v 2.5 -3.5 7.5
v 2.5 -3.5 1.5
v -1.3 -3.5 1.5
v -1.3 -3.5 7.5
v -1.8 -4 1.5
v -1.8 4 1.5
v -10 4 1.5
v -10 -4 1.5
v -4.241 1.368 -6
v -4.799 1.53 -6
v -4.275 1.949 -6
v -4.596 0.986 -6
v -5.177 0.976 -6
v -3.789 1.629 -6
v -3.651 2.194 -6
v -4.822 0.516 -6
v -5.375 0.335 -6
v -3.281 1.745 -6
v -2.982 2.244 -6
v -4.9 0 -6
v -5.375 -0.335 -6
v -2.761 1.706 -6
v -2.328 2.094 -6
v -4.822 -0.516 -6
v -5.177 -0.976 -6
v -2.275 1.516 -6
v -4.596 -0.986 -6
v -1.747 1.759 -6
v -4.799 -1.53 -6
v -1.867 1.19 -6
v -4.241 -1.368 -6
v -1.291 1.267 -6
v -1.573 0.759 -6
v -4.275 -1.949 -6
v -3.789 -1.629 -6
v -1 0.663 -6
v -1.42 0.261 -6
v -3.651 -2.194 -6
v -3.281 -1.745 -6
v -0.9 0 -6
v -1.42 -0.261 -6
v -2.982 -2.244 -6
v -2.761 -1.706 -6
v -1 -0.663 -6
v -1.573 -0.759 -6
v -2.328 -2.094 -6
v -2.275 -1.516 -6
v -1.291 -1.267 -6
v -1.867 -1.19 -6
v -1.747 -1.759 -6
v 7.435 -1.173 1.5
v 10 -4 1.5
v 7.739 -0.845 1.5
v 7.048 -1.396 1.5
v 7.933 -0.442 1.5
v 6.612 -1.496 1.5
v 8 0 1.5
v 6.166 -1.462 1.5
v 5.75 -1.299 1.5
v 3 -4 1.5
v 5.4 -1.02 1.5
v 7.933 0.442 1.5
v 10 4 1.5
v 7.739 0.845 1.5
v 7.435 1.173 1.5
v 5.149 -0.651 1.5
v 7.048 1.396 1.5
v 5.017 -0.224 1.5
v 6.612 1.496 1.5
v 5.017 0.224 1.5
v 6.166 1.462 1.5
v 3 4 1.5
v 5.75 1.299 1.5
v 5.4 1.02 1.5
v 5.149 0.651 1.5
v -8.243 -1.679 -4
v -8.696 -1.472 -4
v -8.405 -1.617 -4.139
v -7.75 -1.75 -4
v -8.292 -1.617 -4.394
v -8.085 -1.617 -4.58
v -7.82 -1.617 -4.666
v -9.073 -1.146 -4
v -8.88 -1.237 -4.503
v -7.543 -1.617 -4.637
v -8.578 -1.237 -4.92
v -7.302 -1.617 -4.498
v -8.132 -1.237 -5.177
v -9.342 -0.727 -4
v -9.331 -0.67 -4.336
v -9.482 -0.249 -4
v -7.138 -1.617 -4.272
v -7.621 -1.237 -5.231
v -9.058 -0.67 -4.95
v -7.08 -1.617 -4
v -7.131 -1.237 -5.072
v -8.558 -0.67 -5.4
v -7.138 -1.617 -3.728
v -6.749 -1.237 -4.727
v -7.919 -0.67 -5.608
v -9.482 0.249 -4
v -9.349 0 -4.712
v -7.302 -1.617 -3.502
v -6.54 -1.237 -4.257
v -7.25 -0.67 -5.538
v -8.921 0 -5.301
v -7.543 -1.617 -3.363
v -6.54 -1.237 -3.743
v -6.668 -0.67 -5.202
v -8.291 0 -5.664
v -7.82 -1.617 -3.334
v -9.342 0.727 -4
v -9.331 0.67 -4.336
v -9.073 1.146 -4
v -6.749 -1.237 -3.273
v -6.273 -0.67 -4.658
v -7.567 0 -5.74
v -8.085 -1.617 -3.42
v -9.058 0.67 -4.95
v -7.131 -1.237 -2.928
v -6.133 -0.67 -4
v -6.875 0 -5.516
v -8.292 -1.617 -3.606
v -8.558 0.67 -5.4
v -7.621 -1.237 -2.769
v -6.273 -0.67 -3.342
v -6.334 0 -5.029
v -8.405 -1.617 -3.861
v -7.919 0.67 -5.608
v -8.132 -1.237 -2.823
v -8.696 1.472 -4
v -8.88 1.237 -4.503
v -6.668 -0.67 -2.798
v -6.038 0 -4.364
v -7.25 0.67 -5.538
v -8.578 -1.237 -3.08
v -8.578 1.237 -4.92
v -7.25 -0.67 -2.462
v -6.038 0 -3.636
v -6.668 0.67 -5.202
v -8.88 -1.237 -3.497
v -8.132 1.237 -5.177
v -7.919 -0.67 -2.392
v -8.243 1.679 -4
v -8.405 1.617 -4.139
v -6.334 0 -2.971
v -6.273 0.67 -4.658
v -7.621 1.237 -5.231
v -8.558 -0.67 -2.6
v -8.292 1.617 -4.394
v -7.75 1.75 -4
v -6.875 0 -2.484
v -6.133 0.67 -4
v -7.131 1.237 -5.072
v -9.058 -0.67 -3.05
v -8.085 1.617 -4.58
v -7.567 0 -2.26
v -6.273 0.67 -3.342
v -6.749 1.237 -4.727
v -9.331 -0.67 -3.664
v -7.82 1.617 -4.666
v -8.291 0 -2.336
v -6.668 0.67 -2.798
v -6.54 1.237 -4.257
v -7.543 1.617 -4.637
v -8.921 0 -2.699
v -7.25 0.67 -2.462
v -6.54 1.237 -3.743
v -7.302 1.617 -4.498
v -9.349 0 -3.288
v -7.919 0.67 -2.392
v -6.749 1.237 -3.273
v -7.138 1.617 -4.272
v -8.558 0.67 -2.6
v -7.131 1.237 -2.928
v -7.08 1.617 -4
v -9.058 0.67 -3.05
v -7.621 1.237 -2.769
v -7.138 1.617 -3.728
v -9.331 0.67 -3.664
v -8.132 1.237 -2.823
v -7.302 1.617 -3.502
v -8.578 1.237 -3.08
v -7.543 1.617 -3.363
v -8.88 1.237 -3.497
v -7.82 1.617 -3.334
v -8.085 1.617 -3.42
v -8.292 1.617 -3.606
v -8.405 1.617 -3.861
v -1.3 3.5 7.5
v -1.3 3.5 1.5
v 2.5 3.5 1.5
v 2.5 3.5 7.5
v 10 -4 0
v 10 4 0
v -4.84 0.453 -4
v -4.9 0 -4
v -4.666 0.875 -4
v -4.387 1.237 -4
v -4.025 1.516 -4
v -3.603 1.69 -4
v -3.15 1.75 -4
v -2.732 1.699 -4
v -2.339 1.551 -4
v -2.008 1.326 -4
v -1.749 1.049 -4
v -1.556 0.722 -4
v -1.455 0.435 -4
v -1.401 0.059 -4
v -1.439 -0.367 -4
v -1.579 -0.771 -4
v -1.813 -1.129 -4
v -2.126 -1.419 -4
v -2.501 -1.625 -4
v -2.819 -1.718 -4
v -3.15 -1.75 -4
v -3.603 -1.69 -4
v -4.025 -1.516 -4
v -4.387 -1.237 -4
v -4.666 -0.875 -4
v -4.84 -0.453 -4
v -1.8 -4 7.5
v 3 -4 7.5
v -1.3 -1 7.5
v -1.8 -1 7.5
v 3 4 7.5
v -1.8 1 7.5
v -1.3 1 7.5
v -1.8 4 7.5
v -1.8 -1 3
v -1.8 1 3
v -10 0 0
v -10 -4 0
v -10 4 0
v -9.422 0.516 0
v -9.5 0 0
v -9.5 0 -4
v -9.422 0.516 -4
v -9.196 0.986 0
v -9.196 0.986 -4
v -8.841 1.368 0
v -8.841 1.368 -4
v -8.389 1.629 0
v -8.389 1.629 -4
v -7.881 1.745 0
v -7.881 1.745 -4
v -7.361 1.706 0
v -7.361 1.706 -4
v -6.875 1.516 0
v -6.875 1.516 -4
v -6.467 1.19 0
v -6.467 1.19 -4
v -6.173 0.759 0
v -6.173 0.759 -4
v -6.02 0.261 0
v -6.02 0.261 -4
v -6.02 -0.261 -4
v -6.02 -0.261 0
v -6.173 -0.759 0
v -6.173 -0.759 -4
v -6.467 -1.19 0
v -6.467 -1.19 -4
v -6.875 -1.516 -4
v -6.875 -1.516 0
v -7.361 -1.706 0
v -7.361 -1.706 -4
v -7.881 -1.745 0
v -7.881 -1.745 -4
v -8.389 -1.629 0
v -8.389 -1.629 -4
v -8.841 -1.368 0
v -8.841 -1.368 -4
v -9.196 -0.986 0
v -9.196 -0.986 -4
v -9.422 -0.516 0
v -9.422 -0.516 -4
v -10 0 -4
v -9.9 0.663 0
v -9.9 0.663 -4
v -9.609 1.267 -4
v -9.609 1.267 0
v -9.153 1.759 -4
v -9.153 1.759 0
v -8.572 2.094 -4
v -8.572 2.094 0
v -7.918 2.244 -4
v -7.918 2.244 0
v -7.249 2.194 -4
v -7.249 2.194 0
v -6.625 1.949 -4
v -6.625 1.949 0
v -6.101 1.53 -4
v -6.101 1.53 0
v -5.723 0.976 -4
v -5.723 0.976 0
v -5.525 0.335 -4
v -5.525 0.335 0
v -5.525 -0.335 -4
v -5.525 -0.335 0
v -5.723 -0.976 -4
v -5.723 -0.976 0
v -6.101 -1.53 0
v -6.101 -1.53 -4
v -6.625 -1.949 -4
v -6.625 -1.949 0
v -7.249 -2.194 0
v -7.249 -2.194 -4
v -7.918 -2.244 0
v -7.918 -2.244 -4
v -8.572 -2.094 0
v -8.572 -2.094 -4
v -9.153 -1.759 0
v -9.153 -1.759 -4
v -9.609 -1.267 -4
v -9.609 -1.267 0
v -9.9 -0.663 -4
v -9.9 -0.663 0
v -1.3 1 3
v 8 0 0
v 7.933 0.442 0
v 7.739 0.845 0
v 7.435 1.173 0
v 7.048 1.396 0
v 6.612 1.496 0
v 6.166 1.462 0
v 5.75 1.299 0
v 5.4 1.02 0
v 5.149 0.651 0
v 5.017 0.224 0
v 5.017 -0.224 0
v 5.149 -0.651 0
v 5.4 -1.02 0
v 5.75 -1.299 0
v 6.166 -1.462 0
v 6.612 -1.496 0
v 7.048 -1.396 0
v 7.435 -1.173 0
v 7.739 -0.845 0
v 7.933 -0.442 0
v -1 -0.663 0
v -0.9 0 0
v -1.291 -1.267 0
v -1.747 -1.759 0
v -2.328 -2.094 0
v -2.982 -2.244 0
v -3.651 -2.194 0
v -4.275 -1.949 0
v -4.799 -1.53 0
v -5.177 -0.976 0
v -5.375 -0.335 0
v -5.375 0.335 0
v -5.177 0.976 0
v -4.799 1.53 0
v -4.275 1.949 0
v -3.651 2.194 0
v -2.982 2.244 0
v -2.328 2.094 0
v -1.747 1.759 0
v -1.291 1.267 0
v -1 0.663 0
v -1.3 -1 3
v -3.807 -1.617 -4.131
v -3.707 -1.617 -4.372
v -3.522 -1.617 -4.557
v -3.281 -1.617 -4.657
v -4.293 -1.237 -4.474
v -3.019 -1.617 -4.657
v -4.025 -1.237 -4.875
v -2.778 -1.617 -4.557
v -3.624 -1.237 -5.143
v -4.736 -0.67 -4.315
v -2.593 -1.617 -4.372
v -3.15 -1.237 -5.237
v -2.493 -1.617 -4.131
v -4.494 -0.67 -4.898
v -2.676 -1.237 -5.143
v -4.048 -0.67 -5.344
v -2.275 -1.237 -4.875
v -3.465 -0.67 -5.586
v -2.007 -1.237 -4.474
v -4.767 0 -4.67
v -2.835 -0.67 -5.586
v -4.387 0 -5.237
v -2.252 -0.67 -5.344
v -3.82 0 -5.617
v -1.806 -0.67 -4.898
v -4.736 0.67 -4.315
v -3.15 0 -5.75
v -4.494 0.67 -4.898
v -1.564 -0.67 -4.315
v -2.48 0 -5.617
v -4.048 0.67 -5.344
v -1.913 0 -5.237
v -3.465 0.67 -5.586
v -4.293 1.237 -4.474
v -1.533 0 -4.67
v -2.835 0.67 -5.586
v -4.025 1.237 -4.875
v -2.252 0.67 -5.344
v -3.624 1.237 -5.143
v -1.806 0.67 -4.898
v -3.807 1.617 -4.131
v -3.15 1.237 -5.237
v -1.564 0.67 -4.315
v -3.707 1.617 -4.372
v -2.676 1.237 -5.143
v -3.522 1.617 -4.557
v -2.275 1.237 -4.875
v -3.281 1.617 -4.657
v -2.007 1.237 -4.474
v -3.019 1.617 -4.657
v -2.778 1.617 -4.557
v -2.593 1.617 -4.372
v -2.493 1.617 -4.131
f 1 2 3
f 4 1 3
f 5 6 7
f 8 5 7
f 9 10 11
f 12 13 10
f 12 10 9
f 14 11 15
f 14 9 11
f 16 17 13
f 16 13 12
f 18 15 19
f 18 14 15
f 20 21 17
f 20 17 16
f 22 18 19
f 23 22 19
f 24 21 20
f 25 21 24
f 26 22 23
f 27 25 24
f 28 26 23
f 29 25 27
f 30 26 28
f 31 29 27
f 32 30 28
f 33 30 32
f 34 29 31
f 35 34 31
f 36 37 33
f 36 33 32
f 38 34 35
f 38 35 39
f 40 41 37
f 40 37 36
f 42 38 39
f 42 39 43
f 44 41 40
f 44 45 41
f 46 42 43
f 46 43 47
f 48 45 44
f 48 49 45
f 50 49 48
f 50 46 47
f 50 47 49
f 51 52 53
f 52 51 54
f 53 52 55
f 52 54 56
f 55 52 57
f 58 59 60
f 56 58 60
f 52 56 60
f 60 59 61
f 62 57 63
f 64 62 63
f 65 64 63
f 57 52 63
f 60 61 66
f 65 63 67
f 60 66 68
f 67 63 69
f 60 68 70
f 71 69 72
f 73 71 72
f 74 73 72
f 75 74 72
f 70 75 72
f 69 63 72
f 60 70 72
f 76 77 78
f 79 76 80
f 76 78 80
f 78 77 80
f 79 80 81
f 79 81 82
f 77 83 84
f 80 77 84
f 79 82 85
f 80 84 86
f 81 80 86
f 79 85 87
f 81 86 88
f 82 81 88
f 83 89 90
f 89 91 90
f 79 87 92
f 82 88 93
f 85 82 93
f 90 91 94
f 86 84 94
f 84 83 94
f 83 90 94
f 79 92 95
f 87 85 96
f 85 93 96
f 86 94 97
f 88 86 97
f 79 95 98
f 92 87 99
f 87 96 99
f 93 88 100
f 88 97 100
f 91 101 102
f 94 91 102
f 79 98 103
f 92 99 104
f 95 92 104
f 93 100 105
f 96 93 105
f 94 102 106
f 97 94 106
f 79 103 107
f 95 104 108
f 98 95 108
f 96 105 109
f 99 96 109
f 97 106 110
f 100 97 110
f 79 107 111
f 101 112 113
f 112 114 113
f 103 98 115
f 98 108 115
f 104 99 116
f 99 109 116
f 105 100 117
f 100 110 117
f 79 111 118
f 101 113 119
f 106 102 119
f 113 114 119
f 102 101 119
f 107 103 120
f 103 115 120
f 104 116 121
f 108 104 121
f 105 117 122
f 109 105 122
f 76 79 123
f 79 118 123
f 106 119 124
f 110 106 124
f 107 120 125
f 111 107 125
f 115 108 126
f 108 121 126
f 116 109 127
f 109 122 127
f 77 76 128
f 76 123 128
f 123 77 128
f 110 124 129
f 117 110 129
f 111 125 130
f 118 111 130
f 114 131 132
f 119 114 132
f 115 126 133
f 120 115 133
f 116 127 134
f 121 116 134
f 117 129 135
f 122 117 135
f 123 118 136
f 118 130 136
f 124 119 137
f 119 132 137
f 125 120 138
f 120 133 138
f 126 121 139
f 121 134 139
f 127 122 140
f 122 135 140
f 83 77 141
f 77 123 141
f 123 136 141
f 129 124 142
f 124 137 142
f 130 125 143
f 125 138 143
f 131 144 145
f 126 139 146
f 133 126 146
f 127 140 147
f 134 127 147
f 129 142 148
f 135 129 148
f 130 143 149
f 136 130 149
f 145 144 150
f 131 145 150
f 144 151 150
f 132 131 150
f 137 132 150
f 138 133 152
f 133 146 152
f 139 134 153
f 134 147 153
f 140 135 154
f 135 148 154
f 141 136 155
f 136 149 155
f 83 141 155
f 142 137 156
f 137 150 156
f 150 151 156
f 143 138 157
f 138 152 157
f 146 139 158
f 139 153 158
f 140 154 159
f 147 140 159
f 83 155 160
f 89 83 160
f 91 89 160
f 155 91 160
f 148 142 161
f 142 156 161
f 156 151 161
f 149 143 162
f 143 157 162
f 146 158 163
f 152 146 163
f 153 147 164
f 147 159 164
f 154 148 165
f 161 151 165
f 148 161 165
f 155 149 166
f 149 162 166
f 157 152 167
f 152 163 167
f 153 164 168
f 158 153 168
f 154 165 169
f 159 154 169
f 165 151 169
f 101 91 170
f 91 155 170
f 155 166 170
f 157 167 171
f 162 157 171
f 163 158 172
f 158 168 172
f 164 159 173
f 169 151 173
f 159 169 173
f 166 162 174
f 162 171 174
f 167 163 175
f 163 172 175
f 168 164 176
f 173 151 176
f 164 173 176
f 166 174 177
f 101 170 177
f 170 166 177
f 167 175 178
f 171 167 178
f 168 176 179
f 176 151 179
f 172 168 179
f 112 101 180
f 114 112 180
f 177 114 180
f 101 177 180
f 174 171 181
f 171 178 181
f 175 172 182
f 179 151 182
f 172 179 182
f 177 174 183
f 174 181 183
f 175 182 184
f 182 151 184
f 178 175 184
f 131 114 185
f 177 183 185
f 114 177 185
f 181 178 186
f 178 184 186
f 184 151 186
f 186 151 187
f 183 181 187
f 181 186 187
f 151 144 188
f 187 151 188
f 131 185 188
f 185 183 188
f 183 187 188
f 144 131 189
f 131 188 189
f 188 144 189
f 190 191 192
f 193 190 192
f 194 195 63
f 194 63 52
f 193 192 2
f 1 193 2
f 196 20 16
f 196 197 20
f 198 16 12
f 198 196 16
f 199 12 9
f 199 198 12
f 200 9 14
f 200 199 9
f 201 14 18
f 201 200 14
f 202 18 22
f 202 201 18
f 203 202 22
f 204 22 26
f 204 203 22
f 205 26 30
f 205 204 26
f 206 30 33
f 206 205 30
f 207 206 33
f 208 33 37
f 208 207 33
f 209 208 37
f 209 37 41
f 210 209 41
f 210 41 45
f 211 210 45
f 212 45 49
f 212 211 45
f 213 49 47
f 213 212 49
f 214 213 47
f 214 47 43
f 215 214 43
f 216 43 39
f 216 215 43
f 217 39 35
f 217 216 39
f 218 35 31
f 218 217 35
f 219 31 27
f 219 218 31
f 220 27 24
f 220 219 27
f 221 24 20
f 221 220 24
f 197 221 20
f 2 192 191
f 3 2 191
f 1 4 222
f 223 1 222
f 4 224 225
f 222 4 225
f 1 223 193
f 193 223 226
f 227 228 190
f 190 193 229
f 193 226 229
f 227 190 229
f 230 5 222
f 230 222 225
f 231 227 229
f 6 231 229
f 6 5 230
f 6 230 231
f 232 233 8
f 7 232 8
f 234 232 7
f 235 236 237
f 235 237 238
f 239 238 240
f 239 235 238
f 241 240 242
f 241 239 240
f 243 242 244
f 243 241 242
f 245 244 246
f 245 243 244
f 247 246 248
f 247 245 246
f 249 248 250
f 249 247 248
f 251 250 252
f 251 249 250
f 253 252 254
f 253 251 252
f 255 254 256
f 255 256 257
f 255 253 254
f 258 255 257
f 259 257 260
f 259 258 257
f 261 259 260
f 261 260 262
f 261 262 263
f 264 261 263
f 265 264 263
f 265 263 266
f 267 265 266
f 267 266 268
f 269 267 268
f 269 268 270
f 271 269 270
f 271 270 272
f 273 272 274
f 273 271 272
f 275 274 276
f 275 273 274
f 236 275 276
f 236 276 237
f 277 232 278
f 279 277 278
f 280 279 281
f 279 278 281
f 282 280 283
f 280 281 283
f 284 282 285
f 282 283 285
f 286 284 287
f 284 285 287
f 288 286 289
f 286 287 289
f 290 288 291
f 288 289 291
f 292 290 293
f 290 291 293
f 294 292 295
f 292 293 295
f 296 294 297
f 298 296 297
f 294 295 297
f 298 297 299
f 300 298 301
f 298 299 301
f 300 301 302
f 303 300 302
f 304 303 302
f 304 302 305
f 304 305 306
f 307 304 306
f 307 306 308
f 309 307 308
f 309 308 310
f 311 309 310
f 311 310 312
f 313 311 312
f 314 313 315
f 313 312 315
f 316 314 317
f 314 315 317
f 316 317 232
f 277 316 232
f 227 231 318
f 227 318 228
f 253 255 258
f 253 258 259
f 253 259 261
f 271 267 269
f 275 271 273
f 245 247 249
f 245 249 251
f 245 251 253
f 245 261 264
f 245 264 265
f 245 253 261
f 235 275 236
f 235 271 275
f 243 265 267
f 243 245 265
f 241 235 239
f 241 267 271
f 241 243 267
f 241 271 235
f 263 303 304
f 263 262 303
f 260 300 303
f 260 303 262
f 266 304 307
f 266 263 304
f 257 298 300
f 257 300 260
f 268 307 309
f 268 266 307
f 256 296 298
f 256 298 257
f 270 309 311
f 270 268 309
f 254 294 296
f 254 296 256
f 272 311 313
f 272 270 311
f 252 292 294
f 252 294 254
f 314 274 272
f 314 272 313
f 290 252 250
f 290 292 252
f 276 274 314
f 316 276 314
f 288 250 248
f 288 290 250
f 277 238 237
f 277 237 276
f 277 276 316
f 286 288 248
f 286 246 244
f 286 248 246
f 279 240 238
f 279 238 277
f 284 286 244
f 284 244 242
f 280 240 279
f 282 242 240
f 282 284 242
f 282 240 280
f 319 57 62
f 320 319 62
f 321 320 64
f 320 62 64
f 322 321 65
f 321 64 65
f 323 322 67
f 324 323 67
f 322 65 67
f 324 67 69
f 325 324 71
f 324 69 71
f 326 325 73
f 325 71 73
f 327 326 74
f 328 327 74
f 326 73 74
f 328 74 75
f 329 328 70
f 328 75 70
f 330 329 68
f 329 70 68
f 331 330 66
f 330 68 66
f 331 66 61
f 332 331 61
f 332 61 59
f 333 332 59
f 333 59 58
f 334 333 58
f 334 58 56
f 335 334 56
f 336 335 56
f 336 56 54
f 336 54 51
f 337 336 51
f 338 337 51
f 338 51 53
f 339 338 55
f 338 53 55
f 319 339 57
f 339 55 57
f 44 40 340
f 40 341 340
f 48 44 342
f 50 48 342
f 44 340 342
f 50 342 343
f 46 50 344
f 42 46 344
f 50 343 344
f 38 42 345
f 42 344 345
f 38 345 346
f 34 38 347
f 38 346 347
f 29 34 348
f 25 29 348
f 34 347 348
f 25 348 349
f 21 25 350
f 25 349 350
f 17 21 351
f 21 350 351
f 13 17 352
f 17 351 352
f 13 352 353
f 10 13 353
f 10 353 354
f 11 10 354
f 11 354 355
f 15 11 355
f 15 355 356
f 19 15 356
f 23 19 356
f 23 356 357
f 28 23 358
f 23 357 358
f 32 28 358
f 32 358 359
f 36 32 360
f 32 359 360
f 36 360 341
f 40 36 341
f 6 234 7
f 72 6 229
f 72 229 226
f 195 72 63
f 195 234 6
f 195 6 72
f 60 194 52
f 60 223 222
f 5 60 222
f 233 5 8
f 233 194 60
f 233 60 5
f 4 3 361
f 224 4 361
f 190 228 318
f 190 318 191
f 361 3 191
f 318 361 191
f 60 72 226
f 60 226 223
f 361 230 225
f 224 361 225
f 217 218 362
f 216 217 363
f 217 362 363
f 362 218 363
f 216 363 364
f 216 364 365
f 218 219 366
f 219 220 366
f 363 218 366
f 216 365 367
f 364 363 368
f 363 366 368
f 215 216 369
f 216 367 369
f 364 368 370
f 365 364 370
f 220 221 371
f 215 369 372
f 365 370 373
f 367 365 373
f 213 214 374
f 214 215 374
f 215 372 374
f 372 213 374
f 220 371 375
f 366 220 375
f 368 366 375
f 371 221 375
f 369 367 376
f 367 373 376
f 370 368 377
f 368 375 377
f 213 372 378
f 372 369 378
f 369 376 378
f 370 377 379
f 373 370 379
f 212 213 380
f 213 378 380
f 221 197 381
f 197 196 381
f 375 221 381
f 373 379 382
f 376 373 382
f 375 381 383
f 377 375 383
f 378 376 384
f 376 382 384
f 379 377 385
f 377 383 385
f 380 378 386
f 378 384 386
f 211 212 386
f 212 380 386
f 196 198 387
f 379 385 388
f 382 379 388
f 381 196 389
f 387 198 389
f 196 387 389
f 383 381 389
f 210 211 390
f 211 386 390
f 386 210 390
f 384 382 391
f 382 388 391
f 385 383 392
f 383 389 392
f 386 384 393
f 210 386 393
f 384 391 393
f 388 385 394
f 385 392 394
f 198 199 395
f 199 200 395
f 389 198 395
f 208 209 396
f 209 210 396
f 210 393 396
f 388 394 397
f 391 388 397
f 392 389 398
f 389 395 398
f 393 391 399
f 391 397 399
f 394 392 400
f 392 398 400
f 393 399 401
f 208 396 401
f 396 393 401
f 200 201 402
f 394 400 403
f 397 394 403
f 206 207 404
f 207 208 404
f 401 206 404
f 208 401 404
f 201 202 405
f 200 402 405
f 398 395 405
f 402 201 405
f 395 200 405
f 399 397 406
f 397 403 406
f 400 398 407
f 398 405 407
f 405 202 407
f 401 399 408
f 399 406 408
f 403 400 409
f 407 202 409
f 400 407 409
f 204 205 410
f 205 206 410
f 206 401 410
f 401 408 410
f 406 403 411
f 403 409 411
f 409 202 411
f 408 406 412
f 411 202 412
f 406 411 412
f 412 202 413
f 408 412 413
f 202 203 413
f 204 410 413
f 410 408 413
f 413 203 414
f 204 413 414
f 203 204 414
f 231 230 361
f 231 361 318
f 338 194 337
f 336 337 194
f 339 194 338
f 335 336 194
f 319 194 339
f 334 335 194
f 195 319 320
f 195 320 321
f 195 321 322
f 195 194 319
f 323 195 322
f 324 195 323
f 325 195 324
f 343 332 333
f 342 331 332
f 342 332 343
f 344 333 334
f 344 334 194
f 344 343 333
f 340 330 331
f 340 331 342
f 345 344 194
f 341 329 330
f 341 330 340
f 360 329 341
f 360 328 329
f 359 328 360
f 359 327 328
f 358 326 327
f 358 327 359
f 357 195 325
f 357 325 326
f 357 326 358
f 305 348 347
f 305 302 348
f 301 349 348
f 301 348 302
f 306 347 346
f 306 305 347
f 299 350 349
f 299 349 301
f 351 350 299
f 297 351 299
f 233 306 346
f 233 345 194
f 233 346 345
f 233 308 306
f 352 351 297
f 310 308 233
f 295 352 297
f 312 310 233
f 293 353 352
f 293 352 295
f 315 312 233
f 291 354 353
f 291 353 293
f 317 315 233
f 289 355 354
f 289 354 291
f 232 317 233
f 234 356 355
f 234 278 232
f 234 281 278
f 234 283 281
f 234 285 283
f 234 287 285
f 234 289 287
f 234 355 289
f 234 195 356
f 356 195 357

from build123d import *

# Parameters (mm, degrees)
EXTRUDE_1_DEPTH     = 1.5
SKETCH_2_R          = 1.4999999999999987
CUT_EXTRUDE_1_DEPTH = 1.5
EXTRUDE_2_DEPTH     = 6
SKETCH_4_W          = 4.500000000000001
SKETCH_4_H          = 2
CUT_EXTRUDE_4_DEPTH = 1
SKETCH_5_R          = 2.250000000000001
SKETCH_5_R_2        = 1.7500000000000016
EXTRUDE_3_DEPTH     = 4
SKETCH_8_R          = 2.250000000000001
SKETCH_8_R_2        = 1.75
EXTRUDE_13_DEPTH    = 4
SKETCH_10_R         = 2.250000000000001
SKETCH_10_R_2       = 1.7500000000000007
EXTRUDE_14_DEPTH    = 2
SKETCH_11_R         = 1.75
EXTRUDE_15_DEPTH    = 4


with BuildPart() as part:
    # 草图1 → 凸台-拉伸1 (new body)
    with BuildSketch(Plane.XY):
        Polygon((-10, 4), (10, 4), (10, -4), (-9.999999999999998, -4), align=None)
    extrude(amount=EXTRUDE_1_DEPTH)

    # 草图2 → 切除-拉伸1 (cut)
    with BuildSketch(Plane.XY.offset(1.5)):
        with Locations((6.500000000000001, 0)):
            Circle(SKETCH_2_R)
    extrude(amount=-CUT_EXTRUDE_1_DEPTH, mode=Mode.SUBTRACT)

    # 草图3 → 凸台-拉伸2 (add)
    with BuildSketch(Plane.XY.offset(1.5)):
        Polygon((-1.7999999999999998, 4), (3, 4), (3.000000000000001, -4), (-1.7999999999999987, -4), align=None)
        Polygon((-1.2999999999999996, 3.5), (2.5, 3.5), (2.5, -3.5), (-1.2999999999999987, -3.4999999999999996), align=None, mode=Mode.SUBTRACT)
    extrude(amount=EXTRUDE_2_DEPTH)

    # 草图4 → 切除-拉伸4 (cut)
    with BuildSketch(Plane.ZY.offset(1.7999999999999992)):
        with Locations((5.25, 0)):
            Rectangle(SKETCH_4_W, SKETCH_4_H)
    extrude(amount=-CUT_EXTRUDE_4_DEPTH, mode=Mode.SUBTRACT)

    # 草图5 → 凸台-拉伸3 (add)
    with BuildSketch(Plane(origin=(0, 0, 0), x_dir=(-1, 0, 0), z_dir=(0, 0, -1))):
        with Locations((7.75, 0)):
            Circle(SKETCH_5_R)
        with Locations((7.75, 0)):
            Circle(SKETCH_5_R_2, mode=Mode.SUBTRACT)
    extrude(amount=EXTRUDE_3_DEPTH)

    # 草图8 → 凸台-拉伸13 (add)
    with BuildSketch(Plane(origin=(0, 0, 0), x_dir=(-1, 0, 0), z_dir=(0, 0, -1))):
        with Locations(Location((3.15, 0, 0), (0, 0, 180))):
            Circle(SKETCH_8_R)
        with Locations((3.15, 0)):
            Circle(SKETCH_8_R_2, mode=Mode.SUBTRACT)
    extrude(amount=EXTRUDE_13_DEPTH)

    # 草图10 → 凸台-拉伸14 (add)
    with BuildSketch(Plane(origin=(0, 0, -4), x_dir=(-1, 0, 0), z_dir=(0, 0, -1))):
        with Locations(Location((3.15, 0, 0), (0, 0, 180))):
            Circle(SKETCH_10_R)
        with Locations((3.15, 0)):
            Circle(SKETCH_10_R_2, mode=Mode.SUBTRACT)
    extrude(amount=EXTRUDE_14_DEPTH)



with BuildPart() as body_2:
    # 草图6 → 旋转1 (revolve)
    with BuildSketch(Plane(origin=(0, 0, -4), x_dir=(-1, 0, 0), z_dir=(0, 0, -1))):
        with BuildLine():
            Line((7.75, 1.7500000000000018), (7.75, -1.7500000000000018))
            ThreePointArc((7.75, -1.7500000000000018), (9.500000000000002, 0), (7.75, 1.7500000000000018))
        make_face()
    revolve(axis=Axis((-7.75, 1.7500000000000018, -4), (0, -1, 0)))


with BuildPart() as body_3:
    # 草图9 → 旋转2 (revolve)
    with BuildSketch(Plane(origin=(0, 0, -4), x_dir=(-1, 0, 0), z_dir=(0, 0, -1))):
        with BuildLine():
            Line((3.15, 1.75), (3.15, -1.75))
            ThreePointArc((3.15, -1.75), (4.9, 0), (3.15, 1.75))
        make_face()
    revolve(axis=Axis((-3.15, 1.75, -4), (0, -1, 0)))


with BuildPart() as part_1:
    add(part.part)

    add(body_3.part)  # 凸台-拉伸15 merges body 3
    # 草图11 → 凸台-拉伸15 (add)
    with BuildSketch(Plane(origin=(0, 0, 0), x_dir=(-1, 0, 0), z_dir=(0, 0, -1))):
        with Locations(Location((3.15, 0, 0), (0, 0, 180))):
            Circle(SKETCH_11_R)
    extrude(amount=EXTRUDE_15_DEPTH)


solid = Compound([body_2.part, part_1.part])
